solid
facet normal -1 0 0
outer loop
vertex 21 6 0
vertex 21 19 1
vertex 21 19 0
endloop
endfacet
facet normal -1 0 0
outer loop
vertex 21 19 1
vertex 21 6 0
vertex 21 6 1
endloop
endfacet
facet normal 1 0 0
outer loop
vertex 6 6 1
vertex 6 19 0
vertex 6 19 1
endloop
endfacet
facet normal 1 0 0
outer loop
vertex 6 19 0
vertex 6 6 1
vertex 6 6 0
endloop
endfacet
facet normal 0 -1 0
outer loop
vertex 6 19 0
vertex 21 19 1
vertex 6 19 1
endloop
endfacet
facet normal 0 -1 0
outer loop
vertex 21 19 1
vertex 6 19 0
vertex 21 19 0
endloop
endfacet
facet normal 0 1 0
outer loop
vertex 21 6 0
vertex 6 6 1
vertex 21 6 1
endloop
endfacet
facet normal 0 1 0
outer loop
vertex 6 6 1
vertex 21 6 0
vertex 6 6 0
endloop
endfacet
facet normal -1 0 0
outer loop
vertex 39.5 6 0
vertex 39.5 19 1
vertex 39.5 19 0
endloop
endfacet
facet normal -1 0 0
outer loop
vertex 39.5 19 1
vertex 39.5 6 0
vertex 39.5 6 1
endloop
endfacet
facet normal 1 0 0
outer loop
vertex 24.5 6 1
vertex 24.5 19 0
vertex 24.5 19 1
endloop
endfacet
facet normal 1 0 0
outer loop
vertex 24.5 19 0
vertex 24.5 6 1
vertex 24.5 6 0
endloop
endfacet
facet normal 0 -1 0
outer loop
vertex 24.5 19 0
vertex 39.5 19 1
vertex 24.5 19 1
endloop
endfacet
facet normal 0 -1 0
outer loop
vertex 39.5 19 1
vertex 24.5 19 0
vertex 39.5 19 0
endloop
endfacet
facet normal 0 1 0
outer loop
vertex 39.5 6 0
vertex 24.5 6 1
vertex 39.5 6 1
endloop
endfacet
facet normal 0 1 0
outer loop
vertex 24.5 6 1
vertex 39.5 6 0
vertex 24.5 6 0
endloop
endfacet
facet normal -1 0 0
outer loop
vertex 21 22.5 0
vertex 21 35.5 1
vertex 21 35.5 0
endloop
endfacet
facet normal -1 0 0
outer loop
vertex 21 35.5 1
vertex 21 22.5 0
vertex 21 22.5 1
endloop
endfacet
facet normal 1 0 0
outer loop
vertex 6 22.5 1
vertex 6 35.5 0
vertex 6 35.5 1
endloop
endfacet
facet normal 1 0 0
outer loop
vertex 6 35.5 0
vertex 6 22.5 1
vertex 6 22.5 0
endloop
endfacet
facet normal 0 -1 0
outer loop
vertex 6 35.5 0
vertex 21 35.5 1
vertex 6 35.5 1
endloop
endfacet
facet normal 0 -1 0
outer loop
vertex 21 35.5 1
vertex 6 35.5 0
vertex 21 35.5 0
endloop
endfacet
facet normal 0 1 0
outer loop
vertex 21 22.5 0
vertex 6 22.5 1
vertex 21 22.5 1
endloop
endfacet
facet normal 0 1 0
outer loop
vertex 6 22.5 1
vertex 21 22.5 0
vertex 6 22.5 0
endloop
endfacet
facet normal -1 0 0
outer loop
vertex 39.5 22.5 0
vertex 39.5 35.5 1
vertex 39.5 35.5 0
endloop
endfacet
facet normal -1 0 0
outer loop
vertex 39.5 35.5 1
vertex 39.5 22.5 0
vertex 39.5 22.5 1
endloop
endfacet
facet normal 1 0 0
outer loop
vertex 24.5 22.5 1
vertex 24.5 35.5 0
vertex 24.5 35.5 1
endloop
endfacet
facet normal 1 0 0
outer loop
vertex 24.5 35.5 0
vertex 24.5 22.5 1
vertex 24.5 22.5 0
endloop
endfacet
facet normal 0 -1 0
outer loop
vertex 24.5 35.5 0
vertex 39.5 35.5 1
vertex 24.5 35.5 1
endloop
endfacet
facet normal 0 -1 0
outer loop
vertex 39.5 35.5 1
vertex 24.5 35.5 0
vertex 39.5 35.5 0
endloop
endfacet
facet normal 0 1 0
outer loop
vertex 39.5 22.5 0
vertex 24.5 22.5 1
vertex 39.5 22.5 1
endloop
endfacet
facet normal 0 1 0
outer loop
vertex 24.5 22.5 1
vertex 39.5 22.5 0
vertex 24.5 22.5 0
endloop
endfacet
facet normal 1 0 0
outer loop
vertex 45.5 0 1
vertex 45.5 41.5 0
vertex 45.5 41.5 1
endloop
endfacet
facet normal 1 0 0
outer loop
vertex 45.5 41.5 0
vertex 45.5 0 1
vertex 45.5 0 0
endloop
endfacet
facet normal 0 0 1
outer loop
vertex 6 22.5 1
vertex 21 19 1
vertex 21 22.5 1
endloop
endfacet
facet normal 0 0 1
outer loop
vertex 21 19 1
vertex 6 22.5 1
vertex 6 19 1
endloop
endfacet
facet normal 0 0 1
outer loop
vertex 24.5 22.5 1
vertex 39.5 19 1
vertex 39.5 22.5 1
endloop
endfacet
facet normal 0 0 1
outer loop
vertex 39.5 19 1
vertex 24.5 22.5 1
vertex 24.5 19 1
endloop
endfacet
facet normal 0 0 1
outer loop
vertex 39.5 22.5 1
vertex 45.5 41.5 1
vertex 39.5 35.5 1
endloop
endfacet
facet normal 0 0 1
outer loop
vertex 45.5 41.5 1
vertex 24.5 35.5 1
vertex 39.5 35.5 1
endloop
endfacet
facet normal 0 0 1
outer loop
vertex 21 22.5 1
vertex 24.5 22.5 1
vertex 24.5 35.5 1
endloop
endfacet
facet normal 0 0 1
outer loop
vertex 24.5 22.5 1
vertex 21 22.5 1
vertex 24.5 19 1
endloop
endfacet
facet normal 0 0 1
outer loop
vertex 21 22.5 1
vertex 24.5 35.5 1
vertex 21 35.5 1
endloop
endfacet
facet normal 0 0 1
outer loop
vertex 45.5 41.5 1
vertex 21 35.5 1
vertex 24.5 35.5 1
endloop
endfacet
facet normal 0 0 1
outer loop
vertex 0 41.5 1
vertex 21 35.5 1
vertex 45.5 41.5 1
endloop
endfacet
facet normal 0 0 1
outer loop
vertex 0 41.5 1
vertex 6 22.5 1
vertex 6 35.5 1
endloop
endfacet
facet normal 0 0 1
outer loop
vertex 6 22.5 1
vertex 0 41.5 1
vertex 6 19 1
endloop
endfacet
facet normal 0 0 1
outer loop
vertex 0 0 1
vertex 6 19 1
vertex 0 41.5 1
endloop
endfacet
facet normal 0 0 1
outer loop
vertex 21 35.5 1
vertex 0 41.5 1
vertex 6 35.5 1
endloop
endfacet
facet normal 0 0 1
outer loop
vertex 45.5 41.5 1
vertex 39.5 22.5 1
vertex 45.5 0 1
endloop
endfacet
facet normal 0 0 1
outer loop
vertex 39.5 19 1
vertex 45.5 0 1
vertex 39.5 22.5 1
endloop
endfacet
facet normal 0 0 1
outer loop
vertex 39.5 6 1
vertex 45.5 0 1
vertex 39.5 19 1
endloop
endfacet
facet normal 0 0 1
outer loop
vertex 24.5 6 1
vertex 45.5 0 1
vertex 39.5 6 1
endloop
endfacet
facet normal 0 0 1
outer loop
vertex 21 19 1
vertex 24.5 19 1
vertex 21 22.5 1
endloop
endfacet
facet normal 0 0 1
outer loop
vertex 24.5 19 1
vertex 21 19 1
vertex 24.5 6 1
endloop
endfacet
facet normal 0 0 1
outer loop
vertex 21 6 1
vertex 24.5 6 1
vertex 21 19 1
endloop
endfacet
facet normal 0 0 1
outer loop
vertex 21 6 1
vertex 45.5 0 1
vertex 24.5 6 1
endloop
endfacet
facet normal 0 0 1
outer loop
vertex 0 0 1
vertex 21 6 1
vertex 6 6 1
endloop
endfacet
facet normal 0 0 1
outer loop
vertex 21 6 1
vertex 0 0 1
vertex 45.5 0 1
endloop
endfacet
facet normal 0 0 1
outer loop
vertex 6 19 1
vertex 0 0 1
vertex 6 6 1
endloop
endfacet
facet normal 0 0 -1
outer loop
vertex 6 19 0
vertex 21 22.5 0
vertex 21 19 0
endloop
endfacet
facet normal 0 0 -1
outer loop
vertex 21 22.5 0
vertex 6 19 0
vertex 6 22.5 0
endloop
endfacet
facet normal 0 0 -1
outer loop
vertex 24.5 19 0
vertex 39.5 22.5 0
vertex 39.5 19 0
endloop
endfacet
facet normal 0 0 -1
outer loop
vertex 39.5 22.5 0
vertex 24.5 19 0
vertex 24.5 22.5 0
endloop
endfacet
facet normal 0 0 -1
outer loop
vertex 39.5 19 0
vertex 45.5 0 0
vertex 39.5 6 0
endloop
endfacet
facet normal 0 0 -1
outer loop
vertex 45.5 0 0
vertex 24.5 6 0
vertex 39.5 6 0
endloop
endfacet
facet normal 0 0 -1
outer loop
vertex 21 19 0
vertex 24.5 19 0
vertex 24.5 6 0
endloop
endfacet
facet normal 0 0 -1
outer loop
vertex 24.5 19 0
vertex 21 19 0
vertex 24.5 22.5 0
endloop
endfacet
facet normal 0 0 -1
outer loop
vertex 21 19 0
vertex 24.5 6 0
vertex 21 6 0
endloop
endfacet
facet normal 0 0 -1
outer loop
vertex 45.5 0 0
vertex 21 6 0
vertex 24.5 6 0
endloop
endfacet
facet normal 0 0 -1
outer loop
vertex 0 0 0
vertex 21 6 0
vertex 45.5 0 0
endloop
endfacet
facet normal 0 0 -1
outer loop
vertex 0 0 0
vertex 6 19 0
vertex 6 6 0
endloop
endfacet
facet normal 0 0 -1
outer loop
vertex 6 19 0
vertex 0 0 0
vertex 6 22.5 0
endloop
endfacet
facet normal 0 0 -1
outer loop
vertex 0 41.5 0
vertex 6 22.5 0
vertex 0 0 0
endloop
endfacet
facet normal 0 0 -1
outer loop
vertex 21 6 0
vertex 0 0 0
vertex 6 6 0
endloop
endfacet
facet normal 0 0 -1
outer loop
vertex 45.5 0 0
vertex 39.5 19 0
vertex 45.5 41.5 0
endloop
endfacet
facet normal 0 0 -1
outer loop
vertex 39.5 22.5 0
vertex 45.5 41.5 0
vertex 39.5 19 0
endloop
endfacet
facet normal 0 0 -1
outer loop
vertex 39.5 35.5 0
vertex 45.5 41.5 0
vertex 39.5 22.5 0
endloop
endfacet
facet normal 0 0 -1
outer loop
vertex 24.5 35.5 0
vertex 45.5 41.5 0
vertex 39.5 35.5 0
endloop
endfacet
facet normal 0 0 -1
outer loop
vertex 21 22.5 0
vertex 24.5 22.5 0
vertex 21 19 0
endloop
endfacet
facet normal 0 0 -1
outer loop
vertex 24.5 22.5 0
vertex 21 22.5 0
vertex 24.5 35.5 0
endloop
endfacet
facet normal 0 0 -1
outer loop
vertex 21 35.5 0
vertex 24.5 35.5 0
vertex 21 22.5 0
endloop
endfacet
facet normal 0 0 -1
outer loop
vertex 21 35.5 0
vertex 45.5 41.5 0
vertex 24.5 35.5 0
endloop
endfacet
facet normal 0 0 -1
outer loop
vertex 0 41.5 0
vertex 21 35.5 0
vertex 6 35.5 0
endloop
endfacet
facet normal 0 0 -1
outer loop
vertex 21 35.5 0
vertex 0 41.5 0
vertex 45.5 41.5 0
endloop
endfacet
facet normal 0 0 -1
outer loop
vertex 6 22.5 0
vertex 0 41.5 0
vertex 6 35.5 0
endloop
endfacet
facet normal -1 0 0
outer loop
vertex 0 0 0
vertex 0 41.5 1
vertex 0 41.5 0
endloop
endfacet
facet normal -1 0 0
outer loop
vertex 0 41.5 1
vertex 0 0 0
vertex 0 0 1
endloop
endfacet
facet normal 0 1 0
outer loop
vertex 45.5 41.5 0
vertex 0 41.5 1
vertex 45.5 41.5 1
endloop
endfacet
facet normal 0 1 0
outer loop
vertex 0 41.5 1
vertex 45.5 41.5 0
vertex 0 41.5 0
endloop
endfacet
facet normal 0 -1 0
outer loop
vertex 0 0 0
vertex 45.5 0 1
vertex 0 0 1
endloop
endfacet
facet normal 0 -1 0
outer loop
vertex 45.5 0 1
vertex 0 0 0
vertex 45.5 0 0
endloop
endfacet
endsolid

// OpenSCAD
/* KeySizeTest
 * Make a small 2x2 matrix to test keyholes.
 */
keyCols = 2;
keyRows = 2;
keyX = 15;
keyY = 13;
keySpace = 3.5;
edgeSpaceAddition = 4;
edgeSpace = (edgeSpaceAddition*2)-keySpace;
keyZ = -1;

moduleX = (edgeSpace+edgeSpaceAddition)+(keySpace*keyCols)+keyX*(keyCols-1)+keyX;
moduleY = (edgeSpace+edgeSpaceAddition)+(keySpace*keyRows)+keyY*(keyRows-1)+keyY;
moduleZ = 1;

keySize = [keyX, keyY, moduleZ+2];

function position(x,y,z) = [edgeSpace+keySpace*x+keyX*(x-1)-(edgeSpaceAddition/2), edgeSpace+keySpace*y+keyY*(y-1)-(edgeSpaceAddition/2), z];

module keyHoles (yStart, yEnd, xStart, xEnd){
    for(y = [yStart:yEnd]){
        for(x = [xStart:xEnd]){
			translate(position(x,y,keyZ)) cube(keySize);
        }
    }
}

difference(){
    cube([moduleX,moduleY,moduleZ]);

	keyHoles(1,2,1,2);
}
